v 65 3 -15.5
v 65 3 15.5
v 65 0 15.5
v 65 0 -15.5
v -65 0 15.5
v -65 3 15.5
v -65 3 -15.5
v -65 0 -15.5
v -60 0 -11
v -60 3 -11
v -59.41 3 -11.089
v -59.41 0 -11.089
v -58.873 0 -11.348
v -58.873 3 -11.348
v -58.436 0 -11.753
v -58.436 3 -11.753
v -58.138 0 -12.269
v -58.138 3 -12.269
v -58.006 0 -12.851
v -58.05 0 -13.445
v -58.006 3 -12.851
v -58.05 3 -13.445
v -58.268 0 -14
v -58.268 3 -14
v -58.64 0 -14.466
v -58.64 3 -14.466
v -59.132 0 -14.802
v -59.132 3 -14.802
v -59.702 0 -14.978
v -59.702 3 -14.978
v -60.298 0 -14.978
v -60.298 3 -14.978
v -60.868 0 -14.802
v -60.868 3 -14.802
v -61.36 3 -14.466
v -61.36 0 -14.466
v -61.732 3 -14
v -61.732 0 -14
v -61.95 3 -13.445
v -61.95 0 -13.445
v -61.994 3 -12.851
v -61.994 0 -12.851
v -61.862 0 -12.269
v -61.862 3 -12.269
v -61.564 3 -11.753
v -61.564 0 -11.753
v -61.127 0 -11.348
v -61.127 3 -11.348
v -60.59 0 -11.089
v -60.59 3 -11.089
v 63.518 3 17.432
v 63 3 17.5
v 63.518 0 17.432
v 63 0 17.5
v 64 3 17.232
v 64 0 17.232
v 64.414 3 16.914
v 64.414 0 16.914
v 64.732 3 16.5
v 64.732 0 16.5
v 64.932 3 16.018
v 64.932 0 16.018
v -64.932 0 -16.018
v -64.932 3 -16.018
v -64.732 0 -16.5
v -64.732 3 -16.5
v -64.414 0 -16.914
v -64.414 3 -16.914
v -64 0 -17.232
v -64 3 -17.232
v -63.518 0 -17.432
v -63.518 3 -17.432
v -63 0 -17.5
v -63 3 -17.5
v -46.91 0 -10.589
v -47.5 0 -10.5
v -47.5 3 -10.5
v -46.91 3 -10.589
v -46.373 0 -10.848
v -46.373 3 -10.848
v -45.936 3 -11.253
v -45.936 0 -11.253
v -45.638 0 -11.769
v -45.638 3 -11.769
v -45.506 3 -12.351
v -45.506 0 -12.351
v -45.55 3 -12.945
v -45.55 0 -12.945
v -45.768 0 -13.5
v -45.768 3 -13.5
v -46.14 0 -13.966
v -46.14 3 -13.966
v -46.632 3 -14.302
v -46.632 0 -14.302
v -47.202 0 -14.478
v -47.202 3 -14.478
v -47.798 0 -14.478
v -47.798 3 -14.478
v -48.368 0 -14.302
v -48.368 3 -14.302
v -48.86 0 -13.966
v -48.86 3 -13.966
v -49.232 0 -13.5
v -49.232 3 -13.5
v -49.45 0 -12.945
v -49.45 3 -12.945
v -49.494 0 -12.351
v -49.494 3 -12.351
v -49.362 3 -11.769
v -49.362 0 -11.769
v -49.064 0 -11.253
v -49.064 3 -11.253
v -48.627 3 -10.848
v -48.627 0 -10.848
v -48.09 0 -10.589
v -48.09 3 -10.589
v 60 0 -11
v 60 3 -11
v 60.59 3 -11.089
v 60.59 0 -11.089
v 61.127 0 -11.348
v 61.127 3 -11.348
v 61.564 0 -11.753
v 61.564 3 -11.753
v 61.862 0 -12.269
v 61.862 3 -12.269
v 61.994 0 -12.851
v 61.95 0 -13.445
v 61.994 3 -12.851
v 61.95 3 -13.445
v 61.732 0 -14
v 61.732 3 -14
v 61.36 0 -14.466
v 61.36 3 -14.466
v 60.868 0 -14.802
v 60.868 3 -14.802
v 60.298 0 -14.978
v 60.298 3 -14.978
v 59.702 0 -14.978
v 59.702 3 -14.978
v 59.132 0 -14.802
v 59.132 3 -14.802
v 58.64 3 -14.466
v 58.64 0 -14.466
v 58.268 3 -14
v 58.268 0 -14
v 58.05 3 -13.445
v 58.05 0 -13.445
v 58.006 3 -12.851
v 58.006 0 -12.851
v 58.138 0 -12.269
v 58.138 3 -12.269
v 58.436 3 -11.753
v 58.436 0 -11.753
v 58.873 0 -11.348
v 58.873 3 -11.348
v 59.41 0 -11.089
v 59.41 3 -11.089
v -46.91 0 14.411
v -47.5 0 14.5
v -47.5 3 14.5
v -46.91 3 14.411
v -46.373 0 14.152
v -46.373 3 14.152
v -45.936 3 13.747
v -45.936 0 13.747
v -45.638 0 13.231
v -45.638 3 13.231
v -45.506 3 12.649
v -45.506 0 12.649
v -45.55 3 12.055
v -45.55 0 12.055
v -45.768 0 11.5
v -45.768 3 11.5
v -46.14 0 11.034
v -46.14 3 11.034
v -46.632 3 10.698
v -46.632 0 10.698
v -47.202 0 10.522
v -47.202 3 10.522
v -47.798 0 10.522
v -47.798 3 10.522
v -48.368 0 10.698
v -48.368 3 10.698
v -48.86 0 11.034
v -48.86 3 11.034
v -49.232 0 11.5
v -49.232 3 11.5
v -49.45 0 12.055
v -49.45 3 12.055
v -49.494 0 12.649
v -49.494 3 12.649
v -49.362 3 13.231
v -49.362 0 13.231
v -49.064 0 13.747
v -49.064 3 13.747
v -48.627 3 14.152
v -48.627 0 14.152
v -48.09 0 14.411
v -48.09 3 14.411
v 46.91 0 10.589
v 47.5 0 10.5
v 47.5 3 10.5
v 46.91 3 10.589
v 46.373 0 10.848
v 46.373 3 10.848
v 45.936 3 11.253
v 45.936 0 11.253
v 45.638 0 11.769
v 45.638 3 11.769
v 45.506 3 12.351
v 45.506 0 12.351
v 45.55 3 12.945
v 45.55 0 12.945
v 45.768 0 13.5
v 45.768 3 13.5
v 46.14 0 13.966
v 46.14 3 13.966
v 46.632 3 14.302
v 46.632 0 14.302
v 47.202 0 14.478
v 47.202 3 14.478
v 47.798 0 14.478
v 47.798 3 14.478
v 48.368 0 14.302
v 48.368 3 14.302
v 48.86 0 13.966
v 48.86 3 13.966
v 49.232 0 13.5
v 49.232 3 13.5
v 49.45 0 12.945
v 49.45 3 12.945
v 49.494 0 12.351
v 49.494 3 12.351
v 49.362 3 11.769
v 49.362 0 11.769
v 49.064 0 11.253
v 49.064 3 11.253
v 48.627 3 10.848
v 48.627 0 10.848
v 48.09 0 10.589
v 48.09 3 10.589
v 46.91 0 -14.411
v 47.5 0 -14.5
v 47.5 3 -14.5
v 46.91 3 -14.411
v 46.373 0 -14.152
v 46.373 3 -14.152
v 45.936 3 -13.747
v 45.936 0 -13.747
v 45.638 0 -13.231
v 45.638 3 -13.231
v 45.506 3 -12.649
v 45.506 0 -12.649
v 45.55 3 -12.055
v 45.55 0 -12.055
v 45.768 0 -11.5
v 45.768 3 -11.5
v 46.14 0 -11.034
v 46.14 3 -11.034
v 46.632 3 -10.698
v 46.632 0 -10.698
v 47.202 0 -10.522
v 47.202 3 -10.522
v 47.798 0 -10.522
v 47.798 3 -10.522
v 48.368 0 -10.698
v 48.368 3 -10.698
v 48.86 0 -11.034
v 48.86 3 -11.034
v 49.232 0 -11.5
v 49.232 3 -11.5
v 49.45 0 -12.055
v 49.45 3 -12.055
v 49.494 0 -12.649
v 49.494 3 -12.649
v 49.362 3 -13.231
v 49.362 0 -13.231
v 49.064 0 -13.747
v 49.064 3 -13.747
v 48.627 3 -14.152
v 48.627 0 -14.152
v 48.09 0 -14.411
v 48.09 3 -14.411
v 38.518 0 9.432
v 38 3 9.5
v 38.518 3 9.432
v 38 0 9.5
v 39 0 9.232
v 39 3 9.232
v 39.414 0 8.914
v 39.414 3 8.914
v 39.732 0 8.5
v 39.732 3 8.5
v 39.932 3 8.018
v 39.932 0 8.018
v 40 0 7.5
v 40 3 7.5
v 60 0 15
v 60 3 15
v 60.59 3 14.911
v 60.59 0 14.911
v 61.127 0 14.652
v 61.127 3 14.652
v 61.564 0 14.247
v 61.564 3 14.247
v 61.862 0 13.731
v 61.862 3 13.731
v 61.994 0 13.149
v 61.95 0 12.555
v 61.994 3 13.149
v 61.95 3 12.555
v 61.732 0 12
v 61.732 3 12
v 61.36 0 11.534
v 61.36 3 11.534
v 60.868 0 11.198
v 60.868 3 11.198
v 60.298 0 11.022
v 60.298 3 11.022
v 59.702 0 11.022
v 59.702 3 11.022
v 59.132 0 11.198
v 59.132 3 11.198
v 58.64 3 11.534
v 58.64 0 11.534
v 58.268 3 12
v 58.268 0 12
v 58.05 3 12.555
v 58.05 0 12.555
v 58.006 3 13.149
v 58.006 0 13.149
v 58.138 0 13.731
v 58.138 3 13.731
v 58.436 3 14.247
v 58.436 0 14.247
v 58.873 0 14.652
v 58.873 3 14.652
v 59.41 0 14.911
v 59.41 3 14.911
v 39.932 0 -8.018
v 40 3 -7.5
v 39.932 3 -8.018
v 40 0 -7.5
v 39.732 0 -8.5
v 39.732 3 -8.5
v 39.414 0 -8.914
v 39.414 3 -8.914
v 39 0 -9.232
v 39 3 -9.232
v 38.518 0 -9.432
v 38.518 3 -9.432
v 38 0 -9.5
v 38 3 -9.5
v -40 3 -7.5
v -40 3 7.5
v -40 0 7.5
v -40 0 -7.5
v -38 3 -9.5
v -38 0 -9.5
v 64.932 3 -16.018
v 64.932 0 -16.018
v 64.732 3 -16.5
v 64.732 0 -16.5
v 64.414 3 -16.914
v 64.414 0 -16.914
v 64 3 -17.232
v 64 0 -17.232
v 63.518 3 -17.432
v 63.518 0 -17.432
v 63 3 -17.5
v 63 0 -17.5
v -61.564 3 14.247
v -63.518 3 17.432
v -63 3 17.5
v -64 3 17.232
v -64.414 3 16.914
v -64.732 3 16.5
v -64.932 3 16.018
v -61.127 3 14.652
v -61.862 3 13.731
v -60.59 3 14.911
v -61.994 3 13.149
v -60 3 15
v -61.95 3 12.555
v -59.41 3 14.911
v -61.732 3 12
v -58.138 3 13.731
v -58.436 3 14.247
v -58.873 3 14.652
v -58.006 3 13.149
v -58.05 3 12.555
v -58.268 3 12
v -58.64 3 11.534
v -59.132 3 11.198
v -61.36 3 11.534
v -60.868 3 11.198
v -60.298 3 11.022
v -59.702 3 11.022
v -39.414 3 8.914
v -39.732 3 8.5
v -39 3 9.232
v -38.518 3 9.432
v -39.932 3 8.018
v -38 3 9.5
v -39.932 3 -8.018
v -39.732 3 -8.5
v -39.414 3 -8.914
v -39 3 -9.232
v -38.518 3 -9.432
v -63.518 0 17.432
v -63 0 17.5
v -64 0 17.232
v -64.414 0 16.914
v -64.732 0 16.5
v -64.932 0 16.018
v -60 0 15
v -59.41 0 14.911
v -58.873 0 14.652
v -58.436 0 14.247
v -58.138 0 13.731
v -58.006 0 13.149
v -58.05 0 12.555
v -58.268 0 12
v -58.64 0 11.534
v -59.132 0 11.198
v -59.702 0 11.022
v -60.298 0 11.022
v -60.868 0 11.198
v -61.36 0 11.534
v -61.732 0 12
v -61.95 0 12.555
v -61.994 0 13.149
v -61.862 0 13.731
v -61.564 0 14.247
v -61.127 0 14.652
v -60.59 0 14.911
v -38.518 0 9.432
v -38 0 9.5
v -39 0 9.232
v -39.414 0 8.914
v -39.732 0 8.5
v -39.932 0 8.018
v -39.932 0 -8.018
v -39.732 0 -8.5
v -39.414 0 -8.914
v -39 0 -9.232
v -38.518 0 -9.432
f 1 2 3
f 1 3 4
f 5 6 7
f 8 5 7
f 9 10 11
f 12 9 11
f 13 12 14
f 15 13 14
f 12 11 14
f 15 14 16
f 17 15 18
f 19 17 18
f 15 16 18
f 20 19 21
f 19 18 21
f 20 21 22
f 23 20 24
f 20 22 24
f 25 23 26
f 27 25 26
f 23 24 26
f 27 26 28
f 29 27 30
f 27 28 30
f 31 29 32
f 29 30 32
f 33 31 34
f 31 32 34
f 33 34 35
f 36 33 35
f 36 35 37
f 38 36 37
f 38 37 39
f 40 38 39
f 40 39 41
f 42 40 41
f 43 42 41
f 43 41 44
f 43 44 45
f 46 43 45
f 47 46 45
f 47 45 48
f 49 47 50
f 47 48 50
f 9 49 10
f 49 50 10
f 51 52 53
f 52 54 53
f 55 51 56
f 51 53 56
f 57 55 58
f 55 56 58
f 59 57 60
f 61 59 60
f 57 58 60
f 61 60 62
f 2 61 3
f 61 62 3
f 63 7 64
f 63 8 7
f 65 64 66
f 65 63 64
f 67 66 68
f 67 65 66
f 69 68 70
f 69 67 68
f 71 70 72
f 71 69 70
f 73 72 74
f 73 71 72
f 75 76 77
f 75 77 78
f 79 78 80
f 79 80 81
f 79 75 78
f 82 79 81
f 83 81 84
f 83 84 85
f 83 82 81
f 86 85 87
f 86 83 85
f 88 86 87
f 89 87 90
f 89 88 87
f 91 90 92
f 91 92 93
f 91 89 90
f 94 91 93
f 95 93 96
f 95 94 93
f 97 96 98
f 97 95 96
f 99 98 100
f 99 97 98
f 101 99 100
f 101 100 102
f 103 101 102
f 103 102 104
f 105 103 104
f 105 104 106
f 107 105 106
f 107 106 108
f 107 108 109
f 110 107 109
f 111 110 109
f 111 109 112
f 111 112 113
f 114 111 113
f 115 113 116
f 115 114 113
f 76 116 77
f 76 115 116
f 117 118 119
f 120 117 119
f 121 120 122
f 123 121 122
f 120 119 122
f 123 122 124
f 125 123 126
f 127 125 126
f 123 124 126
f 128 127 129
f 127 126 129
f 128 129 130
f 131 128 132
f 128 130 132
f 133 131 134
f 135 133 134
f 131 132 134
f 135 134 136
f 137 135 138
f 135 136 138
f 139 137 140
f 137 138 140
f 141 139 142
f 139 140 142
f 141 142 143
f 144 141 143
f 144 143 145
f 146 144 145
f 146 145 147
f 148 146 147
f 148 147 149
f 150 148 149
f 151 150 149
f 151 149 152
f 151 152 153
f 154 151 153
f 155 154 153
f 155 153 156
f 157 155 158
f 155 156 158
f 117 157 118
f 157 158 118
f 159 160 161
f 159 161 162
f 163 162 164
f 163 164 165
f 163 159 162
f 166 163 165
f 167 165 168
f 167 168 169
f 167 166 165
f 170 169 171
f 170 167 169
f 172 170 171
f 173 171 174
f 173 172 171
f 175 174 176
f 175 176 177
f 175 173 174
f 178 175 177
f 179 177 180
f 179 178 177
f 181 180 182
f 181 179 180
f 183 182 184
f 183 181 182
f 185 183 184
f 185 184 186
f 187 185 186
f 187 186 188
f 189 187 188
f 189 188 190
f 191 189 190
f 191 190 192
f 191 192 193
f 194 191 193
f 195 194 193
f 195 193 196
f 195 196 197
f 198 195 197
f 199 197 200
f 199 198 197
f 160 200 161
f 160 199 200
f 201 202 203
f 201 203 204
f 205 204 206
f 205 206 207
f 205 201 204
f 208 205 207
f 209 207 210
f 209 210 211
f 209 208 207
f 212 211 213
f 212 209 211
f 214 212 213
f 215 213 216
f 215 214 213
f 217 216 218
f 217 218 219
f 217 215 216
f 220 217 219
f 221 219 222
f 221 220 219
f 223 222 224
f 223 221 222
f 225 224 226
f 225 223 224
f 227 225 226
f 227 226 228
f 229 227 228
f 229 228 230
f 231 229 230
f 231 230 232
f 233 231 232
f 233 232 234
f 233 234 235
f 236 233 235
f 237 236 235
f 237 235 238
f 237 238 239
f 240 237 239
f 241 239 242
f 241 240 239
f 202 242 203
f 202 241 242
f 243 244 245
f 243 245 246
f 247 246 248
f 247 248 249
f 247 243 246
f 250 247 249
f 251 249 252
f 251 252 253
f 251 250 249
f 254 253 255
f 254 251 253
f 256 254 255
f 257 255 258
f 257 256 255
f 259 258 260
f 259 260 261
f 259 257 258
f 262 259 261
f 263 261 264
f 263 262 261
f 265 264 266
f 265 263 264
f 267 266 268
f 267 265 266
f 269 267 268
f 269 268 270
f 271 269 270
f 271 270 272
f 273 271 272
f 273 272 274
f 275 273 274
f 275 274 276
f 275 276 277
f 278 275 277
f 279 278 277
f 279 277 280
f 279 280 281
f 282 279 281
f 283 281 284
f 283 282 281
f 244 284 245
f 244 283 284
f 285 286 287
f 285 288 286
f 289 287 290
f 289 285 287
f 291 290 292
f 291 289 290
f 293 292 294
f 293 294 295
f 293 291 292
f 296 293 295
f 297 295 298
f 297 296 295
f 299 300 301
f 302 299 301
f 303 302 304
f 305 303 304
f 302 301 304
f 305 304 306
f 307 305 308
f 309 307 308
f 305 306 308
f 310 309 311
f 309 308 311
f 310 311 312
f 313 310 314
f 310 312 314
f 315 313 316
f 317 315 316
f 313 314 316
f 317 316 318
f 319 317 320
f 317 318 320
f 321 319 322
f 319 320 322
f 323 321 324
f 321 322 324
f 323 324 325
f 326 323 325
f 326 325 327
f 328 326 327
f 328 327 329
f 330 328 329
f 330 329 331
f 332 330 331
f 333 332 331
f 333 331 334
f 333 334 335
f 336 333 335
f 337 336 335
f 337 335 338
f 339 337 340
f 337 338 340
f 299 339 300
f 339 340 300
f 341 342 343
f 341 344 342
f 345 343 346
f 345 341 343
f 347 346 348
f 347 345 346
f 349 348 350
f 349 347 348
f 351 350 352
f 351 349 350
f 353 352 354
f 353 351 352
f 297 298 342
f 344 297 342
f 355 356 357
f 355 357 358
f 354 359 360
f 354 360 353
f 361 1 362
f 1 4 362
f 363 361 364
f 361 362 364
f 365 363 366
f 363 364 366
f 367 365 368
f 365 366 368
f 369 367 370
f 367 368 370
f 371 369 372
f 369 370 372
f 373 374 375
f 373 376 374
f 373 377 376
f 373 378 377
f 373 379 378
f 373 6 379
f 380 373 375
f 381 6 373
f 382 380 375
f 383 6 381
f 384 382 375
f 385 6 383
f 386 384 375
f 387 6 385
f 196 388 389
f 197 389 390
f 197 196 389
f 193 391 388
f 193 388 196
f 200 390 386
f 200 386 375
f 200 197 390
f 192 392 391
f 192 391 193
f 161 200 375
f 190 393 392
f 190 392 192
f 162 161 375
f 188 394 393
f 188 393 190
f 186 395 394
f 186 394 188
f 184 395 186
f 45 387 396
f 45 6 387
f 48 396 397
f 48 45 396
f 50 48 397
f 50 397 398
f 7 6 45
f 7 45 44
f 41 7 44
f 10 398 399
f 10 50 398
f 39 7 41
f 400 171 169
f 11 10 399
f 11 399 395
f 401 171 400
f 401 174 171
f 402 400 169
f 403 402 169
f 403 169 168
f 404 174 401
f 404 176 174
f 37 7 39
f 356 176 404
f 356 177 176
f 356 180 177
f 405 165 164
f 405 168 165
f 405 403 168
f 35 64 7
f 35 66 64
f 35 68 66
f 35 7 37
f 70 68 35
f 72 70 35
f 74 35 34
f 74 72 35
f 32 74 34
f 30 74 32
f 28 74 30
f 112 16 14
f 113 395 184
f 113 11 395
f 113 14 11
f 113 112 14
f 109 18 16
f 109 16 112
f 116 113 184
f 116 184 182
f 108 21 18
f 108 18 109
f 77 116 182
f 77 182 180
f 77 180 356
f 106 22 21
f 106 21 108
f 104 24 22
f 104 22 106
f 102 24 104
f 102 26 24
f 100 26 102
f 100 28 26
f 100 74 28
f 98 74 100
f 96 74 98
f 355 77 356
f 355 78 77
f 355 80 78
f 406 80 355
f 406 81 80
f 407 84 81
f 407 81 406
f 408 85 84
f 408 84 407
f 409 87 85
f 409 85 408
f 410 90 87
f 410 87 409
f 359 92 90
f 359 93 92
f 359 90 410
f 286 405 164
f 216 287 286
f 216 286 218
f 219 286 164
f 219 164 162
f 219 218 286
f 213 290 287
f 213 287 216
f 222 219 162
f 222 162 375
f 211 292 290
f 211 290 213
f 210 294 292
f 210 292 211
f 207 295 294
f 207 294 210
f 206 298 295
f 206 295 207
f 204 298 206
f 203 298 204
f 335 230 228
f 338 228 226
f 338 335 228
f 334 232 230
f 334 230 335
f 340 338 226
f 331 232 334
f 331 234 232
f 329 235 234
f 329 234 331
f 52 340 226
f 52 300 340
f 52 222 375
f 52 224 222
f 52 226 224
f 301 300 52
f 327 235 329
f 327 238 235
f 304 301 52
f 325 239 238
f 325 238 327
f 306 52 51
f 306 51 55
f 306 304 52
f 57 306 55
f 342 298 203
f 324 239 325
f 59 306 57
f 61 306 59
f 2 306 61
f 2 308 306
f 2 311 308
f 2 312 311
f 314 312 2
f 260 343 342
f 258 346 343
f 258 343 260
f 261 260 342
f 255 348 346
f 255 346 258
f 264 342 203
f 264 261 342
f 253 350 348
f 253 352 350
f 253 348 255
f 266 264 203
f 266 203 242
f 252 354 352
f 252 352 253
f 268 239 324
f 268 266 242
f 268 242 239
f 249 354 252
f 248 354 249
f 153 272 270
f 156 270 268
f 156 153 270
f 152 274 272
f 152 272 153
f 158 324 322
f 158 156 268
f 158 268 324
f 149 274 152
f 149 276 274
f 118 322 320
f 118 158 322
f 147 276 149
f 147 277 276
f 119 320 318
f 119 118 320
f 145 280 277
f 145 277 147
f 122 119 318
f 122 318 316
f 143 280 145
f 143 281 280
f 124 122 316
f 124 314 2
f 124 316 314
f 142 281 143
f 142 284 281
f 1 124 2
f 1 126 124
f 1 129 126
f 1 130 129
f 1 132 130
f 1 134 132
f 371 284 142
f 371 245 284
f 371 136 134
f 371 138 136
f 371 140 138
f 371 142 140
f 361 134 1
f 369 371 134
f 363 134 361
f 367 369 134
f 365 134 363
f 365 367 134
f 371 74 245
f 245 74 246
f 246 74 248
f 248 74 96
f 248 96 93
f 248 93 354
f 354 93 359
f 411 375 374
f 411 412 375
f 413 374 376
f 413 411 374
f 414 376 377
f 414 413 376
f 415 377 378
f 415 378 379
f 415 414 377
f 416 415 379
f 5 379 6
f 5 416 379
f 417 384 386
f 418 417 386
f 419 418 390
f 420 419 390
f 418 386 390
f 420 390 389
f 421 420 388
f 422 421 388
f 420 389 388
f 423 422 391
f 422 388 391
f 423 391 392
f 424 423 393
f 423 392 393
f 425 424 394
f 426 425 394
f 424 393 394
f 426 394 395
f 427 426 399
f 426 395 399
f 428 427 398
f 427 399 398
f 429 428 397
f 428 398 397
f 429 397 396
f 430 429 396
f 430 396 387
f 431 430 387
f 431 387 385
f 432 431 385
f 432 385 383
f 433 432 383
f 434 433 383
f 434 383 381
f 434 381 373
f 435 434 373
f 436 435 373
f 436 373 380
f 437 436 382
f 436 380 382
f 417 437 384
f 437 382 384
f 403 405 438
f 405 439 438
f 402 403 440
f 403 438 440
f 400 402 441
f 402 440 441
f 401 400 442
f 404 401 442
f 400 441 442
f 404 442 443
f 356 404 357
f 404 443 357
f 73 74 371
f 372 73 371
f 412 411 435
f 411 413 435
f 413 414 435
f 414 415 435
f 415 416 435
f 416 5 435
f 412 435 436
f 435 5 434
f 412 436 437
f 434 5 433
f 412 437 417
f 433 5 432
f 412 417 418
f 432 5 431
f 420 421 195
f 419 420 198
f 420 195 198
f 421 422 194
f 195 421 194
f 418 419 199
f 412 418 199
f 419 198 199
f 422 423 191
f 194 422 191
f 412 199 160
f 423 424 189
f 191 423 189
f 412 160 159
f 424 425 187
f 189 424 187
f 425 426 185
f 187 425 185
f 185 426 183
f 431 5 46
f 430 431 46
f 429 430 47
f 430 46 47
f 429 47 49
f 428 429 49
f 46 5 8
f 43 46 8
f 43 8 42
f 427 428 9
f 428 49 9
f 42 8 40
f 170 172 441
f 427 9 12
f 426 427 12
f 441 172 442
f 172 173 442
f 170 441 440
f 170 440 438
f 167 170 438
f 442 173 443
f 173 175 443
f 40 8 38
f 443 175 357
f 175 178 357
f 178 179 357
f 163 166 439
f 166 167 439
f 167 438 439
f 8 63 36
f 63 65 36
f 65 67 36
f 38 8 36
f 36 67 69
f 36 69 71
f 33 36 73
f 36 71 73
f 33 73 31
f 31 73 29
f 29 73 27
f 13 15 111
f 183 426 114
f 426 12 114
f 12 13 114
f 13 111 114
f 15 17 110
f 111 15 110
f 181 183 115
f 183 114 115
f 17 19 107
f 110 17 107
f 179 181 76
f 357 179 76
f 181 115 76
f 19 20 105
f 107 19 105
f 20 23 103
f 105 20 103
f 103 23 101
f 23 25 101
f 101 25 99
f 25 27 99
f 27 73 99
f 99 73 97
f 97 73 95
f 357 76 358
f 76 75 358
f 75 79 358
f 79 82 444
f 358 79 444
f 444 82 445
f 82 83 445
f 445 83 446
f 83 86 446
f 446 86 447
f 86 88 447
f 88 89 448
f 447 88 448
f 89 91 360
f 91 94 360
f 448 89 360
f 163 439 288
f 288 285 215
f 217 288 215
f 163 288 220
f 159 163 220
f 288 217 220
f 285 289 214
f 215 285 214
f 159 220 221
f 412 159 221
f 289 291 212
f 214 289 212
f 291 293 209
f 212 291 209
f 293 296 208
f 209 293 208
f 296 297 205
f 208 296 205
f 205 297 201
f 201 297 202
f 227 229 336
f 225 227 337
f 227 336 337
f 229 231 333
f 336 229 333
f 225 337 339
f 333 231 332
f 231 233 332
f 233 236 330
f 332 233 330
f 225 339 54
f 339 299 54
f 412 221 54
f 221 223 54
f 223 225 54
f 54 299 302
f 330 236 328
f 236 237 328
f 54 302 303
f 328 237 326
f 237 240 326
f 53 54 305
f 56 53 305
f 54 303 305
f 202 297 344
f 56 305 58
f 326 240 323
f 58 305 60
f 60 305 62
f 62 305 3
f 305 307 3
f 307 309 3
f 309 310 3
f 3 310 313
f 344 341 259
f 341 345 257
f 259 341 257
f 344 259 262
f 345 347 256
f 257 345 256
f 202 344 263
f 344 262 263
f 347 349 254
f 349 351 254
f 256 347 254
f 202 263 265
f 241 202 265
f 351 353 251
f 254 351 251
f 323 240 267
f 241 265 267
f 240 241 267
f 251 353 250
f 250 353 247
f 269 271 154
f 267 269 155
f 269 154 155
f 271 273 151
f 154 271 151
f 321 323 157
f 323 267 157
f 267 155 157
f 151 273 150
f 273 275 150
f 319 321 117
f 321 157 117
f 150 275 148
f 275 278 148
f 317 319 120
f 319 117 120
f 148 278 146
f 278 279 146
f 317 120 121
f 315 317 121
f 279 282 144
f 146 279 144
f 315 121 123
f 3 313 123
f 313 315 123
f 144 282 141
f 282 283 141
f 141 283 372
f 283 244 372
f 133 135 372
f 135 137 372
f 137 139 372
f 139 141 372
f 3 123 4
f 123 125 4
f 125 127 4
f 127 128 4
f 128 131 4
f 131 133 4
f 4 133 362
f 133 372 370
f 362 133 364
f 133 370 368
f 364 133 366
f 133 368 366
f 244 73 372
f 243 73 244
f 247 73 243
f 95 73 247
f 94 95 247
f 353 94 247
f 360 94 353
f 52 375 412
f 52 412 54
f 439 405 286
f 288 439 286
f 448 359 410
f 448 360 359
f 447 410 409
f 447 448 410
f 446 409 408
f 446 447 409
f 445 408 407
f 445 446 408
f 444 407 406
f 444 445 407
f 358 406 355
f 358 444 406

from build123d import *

# Parameters (mm, degrees)
SKETCH_1_W          = 110
SKETCH_1_H          = 35
SKETCH_1_R          = 2
EXTRUDE_1_DEPTH     = 3
SKETCH_2_W          = 10
SKETCH_2_H          = 35
SKETCH_2_R          = 2
EXTRUDE_2_DEPTH     = 3
SKETCH_3_W          = 80
SKETCH_3_H          = 19
CUT_EXTRUDE_1_DEPTH = 3
FILLET_1_R          = 2


with BuildPart() as part:
    # 草图1 → 凸台-拉伸1 (new body)
    with BuildSketch(Plane(origin=(0, 0, 0), x_dir=(1, 0, 0), z_dir=(0, 1, 0))):
        Rectangle(SKETCH_1_W, SKETCH_1_H)
        with Locations(Location((-47.5, 12.5, 0), (0, 0, 270))):
            Circle(SKETCH_1_R, mode=Mode.SUBTRACT)
        with Locations(Location((-47.5, -12.5, 0), (0, 0, 270))):
            Circle(SKETCH_1_R, mode=Mode.SUBTRACT)
        with Locations(Location((47.5, -12.5, 0), (0, 0, 90))):
            Circle(SKETCH_1_R, mode=Mode.SUBTRACT)
        with Locations(Location((47.5, 12.5, 0), (0, 0, 90))):
            Circle(SKETCH_1_R, mode=Mode.SUBTRACT)
    extrude(amount=EXTRUDE_1_DEPTH)

    # 草图2 → 凸台-拉伸2 (add)
    # profile 1 of 2: a face of its own
    with BuildSketch(Plane(origin=(0, 3, 0), x_dir=(1, 0, 0), z_dir=(0, 1, 0))):
        with Locations((60, 0)):
            Rectangle(SKETCH_2_W, SKETCH_2_H)
        with Locations(Location((60, 13, 0), (0, 0, 270))):
            Circle(SKETCH_2_R, mode=Mode.SUBTRACT)
        with Locations(Location((60, -13, 0), (0, 0, 270))):
            Circle(SKETCH_2_R, mode=Mode.SUBTRACT)
    # profile 2 of 2: a face of its own
    with BuildSketch(Plane(origin=(0, 3, 0), x_dir=(1, 0, 0), z_dir=(0, 1, 0))):
        with Locations((-60, 0)):
            Rectangle(SKETCH_2_W, SKETCH_2_H)
        with Locations(Location((-60, 13, 0), (0, 0, 270))):
            Circle(SKETCH_2_R, mode=Mode.SUBTRACT)
        with Locations(Location((-60, -13, 0), (0, 0, 270))):
            Circle(SKETCH_2_R, mode=Mode.SUBTRACT)
    extrude(amount=-EXTRUDE_2_DEPTH)

    # 草图3 → 切除-拉伸1 (cut)
    with BuildSketch(Plane(origin=(0, 3, 0), x_dir=(1, 0, 0), z_dir=(0, 1, 0))):
        Rectangle(SKETCH_3_W, SKETCH_3_H)
    extrude(amount=-CUT_EXTRUDE_1_DEPTH, mode=Mode.SUBTRACT)

    # 圆角1
    fillet_1_edges = [part.edges().sort_by_distance(p)[0] for p in [
        (-65, 1.5, -17.5),
        (-65, 1.5, 17.5),
        (65, 1.5, -17.5),
        (65, 1.5, 17.5),
        (40, 1.5, -9.5),
        (40, 1.5, 9.5),
        (-40, 1.5, 9.5),
        (-40, 1.5, -9.5),
    ]]
    fillet(fillet_1_edges, radius=FILLET_1_R)


solid = part.part
